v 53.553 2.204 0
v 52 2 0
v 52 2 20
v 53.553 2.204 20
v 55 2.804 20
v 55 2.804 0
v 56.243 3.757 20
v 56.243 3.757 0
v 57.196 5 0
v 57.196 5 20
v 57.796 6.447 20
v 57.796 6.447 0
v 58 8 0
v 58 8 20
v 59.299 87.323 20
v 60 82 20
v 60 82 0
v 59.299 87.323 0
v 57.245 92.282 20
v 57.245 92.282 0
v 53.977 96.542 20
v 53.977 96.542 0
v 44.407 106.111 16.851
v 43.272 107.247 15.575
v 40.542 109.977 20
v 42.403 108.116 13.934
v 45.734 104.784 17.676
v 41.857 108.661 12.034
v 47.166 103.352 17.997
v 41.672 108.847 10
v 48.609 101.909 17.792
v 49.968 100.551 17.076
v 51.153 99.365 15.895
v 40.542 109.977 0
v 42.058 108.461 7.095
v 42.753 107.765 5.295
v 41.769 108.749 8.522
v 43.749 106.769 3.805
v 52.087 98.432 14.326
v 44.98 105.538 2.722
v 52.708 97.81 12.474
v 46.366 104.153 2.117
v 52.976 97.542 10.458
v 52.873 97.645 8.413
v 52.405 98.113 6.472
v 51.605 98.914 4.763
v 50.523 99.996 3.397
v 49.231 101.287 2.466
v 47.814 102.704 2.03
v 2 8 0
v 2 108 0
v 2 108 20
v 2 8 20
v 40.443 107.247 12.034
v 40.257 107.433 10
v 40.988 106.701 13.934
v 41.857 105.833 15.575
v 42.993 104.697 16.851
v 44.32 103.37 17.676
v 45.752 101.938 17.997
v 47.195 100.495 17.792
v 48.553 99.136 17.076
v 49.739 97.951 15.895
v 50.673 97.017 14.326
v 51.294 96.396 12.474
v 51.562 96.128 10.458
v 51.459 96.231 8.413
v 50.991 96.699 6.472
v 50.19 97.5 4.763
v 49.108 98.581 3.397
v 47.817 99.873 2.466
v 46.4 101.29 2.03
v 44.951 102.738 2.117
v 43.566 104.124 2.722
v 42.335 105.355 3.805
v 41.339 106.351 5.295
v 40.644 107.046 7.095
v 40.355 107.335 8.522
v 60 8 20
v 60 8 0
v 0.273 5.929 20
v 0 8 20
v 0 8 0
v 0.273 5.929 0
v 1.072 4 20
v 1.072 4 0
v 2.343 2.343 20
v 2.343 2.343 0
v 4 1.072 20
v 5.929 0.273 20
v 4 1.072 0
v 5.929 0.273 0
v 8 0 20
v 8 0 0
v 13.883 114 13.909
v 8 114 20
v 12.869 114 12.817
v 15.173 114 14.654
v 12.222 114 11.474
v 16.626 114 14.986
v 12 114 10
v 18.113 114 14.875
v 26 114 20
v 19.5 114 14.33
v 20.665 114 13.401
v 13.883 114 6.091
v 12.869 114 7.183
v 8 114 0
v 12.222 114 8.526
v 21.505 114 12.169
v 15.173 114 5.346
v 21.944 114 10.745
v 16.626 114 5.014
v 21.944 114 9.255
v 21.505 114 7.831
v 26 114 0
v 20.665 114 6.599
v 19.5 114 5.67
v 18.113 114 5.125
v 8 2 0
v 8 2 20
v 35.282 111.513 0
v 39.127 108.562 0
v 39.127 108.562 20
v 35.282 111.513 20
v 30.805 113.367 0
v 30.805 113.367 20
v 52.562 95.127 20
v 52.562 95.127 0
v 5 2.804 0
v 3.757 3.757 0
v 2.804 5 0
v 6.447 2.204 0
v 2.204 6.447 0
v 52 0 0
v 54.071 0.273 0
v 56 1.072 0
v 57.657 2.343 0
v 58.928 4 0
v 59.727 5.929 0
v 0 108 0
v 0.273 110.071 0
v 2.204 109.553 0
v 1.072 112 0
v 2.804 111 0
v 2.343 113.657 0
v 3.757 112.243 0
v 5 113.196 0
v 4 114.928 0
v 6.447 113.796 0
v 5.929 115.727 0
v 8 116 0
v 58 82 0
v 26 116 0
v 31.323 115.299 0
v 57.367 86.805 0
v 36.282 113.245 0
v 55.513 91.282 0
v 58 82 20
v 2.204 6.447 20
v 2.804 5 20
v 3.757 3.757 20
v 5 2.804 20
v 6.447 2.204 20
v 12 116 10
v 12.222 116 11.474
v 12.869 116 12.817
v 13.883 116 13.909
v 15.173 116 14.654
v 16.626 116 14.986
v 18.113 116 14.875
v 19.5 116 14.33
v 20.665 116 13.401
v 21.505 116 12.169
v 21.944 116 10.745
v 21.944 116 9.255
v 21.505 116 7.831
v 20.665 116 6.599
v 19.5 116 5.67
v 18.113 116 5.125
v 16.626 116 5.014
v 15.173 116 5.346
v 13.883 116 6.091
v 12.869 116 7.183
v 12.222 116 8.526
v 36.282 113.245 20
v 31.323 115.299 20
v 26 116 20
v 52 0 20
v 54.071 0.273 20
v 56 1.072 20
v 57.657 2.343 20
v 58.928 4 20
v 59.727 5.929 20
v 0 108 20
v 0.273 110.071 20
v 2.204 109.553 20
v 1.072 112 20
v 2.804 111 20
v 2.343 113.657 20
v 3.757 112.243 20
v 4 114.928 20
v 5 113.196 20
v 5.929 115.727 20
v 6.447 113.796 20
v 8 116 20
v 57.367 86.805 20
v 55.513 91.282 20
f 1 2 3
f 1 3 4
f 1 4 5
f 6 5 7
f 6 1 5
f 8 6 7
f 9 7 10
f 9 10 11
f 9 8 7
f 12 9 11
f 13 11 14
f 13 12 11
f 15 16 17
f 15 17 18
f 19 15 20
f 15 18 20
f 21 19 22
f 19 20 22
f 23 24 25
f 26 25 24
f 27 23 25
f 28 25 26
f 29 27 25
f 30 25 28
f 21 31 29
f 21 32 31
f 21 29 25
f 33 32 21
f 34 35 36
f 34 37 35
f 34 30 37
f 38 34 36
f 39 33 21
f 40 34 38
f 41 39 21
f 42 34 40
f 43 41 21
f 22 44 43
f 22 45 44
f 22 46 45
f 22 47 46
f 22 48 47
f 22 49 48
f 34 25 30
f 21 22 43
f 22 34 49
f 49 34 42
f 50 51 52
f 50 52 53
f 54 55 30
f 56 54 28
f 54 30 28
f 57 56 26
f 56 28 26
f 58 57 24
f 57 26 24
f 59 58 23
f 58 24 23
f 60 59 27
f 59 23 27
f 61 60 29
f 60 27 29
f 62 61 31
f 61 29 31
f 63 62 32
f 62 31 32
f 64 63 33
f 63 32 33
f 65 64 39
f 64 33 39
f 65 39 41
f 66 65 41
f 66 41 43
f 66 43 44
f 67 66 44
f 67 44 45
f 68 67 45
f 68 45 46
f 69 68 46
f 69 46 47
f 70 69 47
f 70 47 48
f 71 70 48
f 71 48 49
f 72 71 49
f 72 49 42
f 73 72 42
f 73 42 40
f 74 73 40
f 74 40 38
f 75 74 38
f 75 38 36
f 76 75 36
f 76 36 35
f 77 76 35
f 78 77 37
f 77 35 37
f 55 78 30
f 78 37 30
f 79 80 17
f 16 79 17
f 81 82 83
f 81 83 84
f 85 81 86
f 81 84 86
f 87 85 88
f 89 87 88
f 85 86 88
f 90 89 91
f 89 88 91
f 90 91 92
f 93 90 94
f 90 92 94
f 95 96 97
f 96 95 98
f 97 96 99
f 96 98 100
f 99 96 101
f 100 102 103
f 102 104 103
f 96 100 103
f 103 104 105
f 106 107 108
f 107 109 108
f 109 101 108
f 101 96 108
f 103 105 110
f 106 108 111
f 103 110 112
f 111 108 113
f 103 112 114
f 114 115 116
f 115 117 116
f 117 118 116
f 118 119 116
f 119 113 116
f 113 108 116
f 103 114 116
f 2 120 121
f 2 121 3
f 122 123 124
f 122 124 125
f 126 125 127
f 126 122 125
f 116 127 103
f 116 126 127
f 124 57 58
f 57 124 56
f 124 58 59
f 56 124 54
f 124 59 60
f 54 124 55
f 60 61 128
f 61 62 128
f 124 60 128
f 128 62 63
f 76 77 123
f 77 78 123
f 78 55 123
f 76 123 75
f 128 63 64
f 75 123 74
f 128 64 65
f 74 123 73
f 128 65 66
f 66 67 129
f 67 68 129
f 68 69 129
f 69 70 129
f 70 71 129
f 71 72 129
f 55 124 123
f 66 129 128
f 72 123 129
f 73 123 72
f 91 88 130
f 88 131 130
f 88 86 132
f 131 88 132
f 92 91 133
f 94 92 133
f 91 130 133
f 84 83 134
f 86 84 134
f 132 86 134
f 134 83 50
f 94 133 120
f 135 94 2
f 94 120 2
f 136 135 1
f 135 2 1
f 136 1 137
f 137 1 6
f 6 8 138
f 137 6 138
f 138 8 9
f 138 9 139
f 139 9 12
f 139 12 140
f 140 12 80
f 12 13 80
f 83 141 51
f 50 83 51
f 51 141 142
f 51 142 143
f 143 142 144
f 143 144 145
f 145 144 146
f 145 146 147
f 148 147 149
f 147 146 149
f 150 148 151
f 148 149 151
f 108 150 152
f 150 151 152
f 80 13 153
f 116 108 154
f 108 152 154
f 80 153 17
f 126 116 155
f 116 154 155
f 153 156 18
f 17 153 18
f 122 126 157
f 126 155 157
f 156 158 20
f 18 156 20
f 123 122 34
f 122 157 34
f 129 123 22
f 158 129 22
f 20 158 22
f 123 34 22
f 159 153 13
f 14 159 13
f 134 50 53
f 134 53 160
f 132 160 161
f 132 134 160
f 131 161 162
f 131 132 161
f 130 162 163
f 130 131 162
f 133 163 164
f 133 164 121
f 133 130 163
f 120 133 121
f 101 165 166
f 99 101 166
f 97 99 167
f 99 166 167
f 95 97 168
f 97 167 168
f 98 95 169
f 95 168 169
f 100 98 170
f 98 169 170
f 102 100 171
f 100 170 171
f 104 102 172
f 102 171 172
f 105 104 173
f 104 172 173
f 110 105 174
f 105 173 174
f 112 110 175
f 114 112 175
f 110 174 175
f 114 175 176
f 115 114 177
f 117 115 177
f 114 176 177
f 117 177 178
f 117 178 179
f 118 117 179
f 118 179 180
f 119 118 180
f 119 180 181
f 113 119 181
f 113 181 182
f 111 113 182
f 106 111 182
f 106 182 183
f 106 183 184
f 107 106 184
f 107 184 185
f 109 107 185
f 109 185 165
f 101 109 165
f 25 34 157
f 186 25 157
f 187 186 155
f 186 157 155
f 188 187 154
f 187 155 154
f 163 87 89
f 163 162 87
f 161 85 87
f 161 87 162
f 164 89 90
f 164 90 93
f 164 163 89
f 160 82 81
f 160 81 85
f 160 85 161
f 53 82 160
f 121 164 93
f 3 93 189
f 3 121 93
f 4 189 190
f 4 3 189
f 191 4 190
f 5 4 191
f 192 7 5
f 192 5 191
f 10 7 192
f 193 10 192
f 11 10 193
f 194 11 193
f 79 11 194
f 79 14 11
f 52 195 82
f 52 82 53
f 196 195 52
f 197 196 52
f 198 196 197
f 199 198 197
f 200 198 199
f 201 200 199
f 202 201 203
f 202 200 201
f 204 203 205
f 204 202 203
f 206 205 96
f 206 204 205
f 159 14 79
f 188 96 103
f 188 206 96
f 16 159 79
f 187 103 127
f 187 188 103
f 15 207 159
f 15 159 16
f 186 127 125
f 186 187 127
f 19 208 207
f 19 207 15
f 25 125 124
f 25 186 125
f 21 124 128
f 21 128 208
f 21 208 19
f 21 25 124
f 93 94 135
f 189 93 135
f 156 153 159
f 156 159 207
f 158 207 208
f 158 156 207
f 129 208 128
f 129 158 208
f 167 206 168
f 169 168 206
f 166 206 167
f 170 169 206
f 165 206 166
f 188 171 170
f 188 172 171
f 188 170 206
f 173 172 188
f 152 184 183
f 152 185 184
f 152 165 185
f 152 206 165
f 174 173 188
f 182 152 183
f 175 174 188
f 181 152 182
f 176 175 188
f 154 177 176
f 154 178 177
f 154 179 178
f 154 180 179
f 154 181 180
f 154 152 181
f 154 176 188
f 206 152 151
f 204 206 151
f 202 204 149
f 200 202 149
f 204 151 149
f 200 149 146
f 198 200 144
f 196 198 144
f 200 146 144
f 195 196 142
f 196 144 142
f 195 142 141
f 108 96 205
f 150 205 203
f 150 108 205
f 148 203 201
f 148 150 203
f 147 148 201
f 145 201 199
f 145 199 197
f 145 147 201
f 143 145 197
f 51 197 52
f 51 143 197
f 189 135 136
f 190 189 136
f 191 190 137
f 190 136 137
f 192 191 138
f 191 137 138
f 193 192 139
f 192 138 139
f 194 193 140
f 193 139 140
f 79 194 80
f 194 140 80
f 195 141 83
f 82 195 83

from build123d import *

# Parameters (mm, degrees)
PAD_DEPTH       = 20
SKETCH001_R     = 8
POCKET_DEPTH    = 5
SKETCH002_R     = 5
POCKET001_DEPTH = 5


with BuildPart() as part:
    # Sketch → Pad (new body)
    with BuildSketch(Plane.XY):
        with BuildLine():
            Line((60, 8), (60, 82.000001))
            ThreePointArc((60, 82.000001), (58.434586, 89.869877), (53.976662, 96.541638))
            Line((40.541631, 109.976664), (53.976662, 96.541638))
            ThreePointArc((40.541631, 109.976664), (33.869872, 114.434584), (25.999999, 115.999997))
            Line((7.999999, 115.999997), (25.999999, 115.999997))
            ThreePointArc((7.999999, 115.999997), (2.343146, 113.656851), (0, 107.999998))
            Line((0, 107.999998), (0, 8))
            ThreePointArc((0, 8), (2.343146, 2.343146), (8, 0))
            Line((8, 0), (52, 0))
            ThreePointArc((52, 0), (57.656854, 2.343146), (60, 8))
        make_face()
        with BuildLine():
            ThreePointArc((8.00002, 113.999997), (3.757366, 112.242645), (2, 107.999998))
            Line((2, 107.999998), (2, 8))
            ThreePointArc((2, 8), (3.757359, 3.757359), (8, 2))
            Line((8, 2), (52, 2))
            ThreePointArc((52, 2), (56.242641, 3.757359), (58, 8))
            Line((58, 82), (58, 8))
            ThreePointArc((58, 82), (56.586824, 89.104516), (52.562438, 95.127434))
            Line((39.127428, 108.56244), (52.562438, 95.127434))
            ThreePointArc((39.127428, 108.56244), (33.104513, 112.586822), (25.999999, 113.999997))
            Line((8.00002, 113.999997), (25.999999, 113.999997))
        make_face(mode=Mode.SUBTRACT)
    extrude(amount=PAD_DEPTH)

    # Sketch001 → Pocket (cut)
    with BuildSketch(Plane(origin=(75.259141, 75.259166, 0), x_dir=(-0.707107, 0.707107, 0), z_dir=(0.707107, 0.707107, 0))):
        with Locations((39.5, 10)):
            Circle(SKETCH001_R)
    extrude(amount=-POCKET_DEPTH, mode=Mode.SUBTRACT)

    # Sketch002 → Pocket001 (cut)
    with BuildSketch(Plane(origin=(0, 115.999997, 0), x_dir=(-1, 0, 0), z_dir=(0, 1, 0))):
        with Locations((-17, 10)):
            Circle(SKETCH002_R)
    extrude(amount=-POCKET001_DEPTH, mode=Mode.SUBTRACT)


solid = part.part
